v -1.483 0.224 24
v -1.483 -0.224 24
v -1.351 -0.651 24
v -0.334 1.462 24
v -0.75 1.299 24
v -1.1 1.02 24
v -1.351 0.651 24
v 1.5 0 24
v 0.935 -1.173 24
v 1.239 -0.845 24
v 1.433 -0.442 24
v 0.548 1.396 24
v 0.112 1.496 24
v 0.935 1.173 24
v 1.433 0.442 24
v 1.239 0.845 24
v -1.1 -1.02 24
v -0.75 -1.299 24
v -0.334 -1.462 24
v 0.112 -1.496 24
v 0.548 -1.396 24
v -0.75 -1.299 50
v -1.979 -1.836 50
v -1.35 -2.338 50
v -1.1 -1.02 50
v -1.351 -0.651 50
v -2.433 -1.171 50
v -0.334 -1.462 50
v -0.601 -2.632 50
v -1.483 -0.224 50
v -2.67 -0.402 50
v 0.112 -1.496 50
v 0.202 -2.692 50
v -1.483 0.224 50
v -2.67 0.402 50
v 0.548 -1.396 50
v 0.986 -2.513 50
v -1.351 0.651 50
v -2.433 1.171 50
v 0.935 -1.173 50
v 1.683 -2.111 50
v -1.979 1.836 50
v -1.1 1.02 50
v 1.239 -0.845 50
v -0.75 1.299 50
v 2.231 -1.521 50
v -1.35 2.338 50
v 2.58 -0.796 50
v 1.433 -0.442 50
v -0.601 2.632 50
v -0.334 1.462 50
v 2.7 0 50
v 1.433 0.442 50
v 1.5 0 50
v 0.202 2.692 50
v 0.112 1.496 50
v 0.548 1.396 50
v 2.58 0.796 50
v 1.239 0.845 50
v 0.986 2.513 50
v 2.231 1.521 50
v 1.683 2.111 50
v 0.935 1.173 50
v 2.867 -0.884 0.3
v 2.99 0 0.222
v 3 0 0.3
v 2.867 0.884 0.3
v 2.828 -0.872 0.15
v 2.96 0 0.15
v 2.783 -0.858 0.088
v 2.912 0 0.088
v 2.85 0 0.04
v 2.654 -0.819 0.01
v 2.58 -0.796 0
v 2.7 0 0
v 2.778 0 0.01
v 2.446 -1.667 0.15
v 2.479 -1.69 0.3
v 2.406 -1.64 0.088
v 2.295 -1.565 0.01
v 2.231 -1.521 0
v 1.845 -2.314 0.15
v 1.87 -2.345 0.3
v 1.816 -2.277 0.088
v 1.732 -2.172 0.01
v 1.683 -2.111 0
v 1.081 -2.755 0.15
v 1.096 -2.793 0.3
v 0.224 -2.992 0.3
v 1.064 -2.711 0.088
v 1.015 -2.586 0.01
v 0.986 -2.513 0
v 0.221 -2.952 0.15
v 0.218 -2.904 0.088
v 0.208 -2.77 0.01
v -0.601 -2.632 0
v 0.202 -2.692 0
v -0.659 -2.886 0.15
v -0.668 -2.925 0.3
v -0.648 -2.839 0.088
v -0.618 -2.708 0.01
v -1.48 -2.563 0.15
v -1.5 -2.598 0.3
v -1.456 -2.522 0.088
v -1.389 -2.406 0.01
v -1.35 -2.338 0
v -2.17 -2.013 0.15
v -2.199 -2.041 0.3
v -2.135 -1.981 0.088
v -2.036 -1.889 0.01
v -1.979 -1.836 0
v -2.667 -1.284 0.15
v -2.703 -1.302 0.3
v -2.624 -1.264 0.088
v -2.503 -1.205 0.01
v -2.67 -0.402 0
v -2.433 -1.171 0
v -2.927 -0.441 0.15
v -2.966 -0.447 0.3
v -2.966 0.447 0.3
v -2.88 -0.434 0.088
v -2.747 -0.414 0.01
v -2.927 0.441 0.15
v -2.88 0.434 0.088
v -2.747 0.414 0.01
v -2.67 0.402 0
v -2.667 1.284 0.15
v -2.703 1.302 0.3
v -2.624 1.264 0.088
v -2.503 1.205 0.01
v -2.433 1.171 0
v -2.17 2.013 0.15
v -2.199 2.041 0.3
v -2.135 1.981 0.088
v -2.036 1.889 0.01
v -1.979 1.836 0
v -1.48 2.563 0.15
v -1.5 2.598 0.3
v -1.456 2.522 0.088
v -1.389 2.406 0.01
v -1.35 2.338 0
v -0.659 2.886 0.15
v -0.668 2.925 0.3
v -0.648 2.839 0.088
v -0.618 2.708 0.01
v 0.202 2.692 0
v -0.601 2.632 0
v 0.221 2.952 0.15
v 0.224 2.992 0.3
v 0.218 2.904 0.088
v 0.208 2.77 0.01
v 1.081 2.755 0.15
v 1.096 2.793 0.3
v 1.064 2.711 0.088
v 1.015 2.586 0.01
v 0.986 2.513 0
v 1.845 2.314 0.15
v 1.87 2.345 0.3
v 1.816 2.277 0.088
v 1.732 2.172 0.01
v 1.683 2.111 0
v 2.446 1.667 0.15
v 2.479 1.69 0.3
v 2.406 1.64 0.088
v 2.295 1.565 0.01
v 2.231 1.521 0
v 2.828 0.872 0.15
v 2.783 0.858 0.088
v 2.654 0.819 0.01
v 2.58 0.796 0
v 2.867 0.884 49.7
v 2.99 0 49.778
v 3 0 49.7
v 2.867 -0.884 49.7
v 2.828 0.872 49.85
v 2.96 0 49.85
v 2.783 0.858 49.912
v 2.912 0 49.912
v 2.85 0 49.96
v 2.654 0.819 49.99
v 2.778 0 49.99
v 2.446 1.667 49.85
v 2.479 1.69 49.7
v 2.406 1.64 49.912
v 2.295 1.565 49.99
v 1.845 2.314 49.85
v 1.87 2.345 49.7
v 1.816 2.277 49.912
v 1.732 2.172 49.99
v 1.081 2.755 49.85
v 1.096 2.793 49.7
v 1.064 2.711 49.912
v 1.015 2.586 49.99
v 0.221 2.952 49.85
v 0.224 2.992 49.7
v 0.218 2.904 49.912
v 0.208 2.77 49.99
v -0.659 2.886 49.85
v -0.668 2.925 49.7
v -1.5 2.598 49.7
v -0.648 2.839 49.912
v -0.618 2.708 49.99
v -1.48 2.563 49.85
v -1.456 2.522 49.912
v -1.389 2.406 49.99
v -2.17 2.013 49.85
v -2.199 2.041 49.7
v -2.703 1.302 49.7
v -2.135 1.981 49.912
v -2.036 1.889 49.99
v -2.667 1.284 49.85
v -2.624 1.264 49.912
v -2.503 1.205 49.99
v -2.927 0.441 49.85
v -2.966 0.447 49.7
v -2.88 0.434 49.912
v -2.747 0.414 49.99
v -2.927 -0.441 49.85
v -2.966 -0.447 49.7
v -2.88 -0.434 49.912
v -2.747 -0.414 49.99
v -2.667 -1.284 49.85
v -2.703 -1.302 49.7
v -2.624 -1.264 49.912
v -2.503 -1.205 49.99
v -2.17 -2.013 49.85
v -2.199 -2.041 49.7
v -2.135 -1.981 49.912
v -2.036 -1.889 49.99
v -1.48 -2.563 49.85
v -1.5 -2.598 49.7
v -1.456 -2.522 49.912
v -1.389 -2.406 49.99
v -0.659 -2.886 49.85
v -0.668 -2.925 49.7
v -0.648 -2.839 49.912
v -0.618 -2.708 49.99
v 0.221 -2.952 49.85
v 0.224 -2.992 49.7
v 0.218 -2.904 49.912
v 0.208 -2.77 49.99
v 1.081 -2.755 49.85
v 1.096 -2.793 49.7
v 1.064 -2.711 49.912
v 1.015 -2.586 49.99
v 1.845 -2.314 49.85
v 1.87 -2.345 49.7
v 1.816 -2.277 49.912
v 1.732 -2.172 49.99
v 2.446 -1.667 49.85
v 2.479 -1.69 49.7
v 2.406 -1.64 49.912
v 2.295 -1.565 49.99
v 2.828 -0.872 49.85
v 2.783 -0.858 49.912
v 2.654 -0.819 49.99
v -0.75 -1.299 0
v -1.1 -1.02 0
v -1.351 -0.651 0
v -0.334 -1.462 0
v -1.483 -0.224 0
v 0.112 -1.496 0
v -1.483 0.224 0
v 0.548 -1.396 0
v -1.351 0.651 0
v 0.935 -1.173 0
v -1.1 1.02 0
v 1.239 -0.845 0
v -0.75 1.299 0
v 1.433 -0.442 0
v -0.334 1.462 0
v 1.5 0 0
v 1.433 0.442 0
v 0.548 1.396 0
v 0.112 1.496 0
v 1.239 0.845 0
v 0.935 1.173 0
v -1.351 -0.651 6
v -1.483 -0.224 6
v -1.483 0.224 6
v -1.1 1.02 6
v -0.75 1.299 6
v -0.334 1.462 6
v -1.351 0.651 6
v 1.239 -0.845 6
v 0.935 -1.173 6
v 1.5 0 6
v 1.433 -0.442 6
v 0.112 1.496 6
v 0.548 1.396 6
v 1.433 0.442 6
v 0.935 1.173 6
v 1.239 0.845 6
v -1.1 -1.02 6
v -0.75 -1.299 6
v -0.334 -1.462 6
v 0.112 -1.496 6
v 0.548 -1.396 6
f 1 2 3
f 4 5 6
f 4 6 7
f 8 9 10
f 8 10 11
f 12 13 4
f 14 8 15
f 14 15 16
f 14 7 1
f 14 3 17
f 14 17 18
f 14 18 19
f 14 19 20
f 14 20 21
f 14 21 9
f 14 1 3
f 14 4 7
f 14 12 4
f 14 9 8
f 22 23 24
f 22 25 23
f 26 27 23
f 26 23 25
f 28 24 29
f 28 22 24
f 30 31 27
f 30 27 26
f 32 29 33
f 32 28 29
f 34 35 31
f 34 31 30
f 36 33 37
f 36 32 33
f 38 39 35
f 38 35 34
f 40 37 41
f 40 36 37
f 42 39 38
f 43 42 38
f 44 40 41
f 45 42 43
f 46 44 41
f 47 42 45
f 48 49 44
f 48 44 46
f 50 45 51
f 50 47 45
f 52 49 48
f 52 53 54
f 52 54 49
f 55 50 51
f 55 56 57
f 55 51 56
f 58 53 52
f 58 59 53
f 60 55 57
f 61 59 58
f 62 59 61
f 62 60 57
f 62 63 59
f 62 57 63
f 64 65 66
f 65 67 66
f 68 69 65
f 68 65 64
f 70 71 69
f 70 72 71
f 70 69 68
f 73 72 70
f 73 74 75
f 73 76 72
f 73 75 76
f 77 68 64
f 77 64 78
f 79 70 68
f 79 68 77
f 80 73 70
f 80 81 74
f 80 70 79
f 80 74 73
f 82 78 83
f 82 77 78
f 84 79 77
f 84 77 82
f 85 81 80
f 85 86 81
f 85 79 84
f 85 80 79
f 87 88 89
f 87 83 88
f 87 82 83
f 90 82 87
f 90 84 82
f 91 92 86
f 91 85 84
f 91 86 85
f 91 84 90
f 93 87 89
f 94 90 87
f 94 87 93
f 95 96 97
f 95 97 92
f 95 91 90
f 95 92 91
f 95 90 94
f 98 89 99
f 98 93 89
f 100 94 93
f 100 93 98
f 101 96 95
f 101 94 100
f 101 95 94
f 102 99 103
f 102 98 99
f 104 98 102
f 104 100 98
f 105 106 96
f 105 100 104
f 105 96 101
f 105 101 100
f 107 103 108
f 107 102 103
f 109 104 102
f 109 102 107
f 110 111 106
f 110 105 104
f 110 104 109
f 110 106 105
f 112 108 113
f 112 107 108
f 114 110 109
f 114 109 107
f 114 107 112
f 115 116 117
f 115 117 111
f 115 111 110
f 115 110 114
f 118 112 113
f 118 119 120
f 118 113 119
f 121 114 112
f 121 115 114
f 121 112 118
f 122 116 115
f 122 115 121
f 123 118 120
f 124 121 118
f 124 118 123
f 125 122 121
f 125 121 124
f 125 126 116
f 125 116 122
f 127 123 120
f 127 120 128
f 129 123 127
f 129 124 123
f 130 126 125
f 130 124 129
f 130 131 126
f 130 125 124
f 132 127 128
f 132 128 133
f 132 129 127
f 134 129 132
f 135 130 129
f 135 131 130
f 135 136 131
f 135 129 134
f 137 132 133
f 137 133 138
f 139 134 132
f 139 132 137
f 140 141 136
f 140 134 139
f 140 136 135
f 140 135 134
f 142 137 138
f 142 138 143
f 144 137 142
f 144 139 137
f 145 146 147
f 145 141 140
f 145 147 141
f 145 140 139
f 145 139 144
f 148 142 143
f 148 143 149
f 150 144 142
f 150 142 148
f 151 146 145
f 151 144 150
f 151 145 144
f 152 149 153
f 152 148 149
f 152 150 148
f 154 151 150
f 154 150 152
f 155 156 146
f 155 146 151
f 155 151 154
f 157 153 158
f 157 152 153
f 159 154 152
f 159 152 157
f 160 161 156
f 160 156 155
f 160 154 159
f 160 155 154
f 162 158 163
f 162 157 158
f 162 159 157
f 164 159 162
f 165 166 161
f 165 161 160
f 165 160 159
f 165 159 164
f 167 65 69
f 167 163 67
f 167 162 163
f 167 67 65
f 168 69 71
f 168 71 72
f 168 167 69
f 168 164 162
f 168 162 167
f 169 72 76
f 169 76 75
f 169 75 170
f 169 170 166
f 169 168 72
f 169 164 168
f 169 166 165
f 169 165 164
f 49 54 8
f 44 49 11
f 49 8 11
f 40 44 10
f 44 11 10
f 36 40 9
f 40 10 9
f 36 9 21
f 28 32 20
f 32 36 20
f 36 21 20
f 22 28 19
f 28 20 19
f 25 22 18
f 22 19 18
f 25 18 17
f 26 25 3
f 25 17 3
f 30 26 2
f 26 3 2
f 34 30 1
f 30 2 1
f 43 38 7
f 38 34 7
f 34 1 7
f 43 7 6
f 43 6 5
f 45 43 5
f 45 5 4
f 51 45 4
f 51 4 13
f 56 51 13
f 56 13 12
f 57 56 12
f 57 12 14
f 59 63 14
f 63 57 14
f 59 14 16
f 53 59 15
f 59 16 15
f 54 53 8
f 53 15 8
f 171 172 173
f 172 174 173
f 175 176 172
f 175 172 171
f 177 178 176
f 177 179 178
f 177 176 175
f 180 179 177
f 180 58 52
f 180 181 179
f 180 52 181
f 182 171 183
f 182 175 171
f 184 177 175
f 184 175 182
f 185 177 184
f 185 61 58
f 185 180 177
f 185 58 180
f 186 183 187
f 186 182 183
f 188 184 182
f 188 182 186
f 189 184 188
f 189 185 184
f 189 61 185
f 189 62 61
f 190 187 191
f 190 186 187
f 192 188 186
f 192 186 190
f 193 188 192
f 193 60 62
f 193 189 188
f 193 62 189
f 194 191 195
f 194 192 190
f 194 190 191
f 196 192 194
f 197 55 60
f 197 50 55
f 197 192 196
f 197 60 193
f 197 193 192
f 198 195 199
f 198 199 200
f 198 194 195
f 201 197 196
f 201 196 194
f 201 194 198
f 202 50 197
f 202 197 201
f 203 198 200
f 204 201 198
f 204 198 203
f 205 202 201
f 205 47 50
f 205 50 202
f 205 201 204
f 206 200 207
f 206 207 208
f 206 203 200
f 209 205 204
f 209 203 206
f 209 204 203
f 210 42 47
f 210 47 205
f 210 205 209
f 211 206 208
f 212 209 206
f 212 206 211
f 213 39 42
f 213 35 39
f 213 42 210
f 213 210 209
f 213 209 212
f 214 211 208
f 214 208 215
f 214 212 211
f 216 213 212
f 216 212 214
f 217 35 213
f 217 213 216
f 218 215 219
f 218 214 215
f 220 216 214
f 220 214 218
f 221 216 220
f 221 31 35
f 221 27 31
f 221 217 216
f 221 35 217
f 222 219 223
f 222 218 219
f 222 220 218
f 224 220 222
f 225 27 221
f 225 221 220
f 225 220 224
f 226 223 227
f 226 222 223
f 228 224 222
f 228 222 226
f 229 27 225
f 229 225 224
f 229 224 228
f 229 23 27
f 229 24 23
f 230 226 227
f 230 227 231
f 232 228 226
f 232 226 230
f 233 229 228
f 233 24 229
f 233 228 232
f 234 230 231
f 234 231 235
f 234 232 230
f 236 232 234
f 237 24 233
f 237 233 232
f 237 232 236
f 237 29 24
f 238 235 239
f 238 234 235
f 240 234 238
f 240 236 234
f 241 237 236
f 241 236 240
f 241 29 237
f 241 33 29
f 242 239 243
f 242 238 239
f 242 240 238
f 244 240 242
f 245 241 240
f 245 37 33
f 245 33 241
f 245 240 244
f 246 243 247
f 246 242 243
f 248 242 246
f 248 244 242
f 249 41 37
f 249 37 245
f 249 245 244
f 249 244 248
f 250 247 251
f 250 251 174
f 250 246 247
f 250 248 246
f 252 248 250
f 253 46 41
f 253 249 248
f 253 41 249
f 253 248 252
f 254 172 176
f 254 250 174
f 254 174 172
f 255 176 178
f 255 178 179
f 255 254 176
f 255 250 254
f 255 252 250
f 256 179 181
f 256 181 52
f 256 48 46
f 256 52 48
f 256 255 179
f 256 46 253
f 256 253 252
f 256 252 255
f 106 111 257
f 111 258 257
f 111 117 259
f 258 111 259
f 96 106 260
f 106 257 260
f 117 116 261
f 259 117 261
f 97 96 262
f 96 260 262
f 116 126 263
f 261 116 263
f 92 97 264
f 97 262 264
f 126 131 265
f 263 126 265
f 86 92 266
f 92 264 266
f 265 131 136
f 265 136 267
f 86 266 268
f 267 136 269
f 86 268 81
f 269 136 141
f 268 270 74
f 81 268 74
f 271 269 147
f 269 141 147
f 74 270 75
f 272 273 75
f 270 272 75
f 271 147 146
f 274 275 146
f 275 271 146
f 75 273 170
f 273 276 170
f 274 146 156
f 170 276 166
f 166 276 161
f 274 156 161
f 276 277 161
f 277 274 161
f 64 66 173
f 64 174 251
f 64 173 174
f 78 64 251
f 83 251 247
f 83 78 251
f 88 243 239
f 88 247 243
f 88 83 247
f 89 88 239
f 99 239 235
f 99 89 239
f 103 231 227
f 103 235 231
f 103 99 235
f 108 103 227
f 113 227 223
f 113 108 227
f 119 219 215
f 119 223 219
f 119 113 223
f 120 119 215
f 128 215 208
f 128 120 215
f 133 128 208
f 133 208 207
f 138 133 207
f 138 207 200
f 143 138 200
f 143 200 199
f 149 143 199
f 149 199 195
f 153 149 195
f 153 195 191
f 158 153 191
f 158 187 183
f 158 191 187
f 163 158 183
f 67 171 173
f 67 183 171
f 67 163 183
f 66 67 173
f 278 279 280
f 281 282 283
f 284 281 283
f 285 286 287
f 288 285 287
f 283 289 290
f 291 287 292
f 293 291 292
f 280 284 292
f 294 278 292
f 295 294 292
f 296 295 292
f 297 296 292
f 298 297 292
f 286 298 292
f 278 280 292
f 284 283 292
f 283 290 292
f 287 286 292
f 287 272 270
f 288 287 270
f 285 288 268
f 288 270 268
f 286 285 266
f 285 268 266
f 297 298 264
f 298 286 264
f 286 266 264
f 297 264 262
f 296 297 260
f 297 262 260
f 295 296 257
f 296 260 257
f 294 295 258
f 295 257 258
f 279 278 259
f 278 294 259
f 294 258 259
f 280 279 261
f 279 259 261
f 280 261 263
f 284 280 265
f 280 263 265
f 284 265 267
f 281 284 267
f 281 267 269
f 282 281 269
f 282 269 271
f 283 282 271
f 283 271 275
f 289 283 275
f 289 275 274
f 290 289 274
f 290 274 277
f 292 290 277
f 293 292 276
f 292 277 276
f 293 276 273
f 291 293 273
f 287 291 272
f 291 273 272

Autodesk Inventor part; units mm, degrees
ref_plane "YZ Plane" through (0, 0, 0) normal (1, 0, 0) x (0, 1, 0)
ref_plane "XZ Plane" through (0, 0, 0) normal (0, 1, 0) x (-1, 0, 0)
ref_plane "XY Plane" through (0, 0, 0) normal (0, 0, 1) x (1, 0, 0)
sketch "スケッチ1" plane through (0, 0, 0) normal (0, 0, 1) x (1, 0, 0)
  circle A0 centre (0, 0) radius 3
  circle A1 centre (0, 0) radius 1.5
  dimension "d0" = 6
  dimension "d1" = 3
extrude "押し出し1" add sketch "スケッチ1" along normal blind 50
fillet "フィレット1" radius 0.3 2 edges at (-3, 0, 50) (-3, 0, 0)
thread "ねじ1" size "M3x0.5" class "6H" standard "ANSI Metric M Profile" length 100
extrude "押し出し2" add sketch "スケッチ1" along normal blind 24 contours A1
extrude "押し出し3" cut sketch "スケッチ1" along normal blind 6 contours A1
thread "ねじ2" size "M3x0.5" class "6H" standard "ANSI Metric M Profile" full length
properties part number "スペーサーM3L50アルミ" material "アルミニウム 2014-T4"
